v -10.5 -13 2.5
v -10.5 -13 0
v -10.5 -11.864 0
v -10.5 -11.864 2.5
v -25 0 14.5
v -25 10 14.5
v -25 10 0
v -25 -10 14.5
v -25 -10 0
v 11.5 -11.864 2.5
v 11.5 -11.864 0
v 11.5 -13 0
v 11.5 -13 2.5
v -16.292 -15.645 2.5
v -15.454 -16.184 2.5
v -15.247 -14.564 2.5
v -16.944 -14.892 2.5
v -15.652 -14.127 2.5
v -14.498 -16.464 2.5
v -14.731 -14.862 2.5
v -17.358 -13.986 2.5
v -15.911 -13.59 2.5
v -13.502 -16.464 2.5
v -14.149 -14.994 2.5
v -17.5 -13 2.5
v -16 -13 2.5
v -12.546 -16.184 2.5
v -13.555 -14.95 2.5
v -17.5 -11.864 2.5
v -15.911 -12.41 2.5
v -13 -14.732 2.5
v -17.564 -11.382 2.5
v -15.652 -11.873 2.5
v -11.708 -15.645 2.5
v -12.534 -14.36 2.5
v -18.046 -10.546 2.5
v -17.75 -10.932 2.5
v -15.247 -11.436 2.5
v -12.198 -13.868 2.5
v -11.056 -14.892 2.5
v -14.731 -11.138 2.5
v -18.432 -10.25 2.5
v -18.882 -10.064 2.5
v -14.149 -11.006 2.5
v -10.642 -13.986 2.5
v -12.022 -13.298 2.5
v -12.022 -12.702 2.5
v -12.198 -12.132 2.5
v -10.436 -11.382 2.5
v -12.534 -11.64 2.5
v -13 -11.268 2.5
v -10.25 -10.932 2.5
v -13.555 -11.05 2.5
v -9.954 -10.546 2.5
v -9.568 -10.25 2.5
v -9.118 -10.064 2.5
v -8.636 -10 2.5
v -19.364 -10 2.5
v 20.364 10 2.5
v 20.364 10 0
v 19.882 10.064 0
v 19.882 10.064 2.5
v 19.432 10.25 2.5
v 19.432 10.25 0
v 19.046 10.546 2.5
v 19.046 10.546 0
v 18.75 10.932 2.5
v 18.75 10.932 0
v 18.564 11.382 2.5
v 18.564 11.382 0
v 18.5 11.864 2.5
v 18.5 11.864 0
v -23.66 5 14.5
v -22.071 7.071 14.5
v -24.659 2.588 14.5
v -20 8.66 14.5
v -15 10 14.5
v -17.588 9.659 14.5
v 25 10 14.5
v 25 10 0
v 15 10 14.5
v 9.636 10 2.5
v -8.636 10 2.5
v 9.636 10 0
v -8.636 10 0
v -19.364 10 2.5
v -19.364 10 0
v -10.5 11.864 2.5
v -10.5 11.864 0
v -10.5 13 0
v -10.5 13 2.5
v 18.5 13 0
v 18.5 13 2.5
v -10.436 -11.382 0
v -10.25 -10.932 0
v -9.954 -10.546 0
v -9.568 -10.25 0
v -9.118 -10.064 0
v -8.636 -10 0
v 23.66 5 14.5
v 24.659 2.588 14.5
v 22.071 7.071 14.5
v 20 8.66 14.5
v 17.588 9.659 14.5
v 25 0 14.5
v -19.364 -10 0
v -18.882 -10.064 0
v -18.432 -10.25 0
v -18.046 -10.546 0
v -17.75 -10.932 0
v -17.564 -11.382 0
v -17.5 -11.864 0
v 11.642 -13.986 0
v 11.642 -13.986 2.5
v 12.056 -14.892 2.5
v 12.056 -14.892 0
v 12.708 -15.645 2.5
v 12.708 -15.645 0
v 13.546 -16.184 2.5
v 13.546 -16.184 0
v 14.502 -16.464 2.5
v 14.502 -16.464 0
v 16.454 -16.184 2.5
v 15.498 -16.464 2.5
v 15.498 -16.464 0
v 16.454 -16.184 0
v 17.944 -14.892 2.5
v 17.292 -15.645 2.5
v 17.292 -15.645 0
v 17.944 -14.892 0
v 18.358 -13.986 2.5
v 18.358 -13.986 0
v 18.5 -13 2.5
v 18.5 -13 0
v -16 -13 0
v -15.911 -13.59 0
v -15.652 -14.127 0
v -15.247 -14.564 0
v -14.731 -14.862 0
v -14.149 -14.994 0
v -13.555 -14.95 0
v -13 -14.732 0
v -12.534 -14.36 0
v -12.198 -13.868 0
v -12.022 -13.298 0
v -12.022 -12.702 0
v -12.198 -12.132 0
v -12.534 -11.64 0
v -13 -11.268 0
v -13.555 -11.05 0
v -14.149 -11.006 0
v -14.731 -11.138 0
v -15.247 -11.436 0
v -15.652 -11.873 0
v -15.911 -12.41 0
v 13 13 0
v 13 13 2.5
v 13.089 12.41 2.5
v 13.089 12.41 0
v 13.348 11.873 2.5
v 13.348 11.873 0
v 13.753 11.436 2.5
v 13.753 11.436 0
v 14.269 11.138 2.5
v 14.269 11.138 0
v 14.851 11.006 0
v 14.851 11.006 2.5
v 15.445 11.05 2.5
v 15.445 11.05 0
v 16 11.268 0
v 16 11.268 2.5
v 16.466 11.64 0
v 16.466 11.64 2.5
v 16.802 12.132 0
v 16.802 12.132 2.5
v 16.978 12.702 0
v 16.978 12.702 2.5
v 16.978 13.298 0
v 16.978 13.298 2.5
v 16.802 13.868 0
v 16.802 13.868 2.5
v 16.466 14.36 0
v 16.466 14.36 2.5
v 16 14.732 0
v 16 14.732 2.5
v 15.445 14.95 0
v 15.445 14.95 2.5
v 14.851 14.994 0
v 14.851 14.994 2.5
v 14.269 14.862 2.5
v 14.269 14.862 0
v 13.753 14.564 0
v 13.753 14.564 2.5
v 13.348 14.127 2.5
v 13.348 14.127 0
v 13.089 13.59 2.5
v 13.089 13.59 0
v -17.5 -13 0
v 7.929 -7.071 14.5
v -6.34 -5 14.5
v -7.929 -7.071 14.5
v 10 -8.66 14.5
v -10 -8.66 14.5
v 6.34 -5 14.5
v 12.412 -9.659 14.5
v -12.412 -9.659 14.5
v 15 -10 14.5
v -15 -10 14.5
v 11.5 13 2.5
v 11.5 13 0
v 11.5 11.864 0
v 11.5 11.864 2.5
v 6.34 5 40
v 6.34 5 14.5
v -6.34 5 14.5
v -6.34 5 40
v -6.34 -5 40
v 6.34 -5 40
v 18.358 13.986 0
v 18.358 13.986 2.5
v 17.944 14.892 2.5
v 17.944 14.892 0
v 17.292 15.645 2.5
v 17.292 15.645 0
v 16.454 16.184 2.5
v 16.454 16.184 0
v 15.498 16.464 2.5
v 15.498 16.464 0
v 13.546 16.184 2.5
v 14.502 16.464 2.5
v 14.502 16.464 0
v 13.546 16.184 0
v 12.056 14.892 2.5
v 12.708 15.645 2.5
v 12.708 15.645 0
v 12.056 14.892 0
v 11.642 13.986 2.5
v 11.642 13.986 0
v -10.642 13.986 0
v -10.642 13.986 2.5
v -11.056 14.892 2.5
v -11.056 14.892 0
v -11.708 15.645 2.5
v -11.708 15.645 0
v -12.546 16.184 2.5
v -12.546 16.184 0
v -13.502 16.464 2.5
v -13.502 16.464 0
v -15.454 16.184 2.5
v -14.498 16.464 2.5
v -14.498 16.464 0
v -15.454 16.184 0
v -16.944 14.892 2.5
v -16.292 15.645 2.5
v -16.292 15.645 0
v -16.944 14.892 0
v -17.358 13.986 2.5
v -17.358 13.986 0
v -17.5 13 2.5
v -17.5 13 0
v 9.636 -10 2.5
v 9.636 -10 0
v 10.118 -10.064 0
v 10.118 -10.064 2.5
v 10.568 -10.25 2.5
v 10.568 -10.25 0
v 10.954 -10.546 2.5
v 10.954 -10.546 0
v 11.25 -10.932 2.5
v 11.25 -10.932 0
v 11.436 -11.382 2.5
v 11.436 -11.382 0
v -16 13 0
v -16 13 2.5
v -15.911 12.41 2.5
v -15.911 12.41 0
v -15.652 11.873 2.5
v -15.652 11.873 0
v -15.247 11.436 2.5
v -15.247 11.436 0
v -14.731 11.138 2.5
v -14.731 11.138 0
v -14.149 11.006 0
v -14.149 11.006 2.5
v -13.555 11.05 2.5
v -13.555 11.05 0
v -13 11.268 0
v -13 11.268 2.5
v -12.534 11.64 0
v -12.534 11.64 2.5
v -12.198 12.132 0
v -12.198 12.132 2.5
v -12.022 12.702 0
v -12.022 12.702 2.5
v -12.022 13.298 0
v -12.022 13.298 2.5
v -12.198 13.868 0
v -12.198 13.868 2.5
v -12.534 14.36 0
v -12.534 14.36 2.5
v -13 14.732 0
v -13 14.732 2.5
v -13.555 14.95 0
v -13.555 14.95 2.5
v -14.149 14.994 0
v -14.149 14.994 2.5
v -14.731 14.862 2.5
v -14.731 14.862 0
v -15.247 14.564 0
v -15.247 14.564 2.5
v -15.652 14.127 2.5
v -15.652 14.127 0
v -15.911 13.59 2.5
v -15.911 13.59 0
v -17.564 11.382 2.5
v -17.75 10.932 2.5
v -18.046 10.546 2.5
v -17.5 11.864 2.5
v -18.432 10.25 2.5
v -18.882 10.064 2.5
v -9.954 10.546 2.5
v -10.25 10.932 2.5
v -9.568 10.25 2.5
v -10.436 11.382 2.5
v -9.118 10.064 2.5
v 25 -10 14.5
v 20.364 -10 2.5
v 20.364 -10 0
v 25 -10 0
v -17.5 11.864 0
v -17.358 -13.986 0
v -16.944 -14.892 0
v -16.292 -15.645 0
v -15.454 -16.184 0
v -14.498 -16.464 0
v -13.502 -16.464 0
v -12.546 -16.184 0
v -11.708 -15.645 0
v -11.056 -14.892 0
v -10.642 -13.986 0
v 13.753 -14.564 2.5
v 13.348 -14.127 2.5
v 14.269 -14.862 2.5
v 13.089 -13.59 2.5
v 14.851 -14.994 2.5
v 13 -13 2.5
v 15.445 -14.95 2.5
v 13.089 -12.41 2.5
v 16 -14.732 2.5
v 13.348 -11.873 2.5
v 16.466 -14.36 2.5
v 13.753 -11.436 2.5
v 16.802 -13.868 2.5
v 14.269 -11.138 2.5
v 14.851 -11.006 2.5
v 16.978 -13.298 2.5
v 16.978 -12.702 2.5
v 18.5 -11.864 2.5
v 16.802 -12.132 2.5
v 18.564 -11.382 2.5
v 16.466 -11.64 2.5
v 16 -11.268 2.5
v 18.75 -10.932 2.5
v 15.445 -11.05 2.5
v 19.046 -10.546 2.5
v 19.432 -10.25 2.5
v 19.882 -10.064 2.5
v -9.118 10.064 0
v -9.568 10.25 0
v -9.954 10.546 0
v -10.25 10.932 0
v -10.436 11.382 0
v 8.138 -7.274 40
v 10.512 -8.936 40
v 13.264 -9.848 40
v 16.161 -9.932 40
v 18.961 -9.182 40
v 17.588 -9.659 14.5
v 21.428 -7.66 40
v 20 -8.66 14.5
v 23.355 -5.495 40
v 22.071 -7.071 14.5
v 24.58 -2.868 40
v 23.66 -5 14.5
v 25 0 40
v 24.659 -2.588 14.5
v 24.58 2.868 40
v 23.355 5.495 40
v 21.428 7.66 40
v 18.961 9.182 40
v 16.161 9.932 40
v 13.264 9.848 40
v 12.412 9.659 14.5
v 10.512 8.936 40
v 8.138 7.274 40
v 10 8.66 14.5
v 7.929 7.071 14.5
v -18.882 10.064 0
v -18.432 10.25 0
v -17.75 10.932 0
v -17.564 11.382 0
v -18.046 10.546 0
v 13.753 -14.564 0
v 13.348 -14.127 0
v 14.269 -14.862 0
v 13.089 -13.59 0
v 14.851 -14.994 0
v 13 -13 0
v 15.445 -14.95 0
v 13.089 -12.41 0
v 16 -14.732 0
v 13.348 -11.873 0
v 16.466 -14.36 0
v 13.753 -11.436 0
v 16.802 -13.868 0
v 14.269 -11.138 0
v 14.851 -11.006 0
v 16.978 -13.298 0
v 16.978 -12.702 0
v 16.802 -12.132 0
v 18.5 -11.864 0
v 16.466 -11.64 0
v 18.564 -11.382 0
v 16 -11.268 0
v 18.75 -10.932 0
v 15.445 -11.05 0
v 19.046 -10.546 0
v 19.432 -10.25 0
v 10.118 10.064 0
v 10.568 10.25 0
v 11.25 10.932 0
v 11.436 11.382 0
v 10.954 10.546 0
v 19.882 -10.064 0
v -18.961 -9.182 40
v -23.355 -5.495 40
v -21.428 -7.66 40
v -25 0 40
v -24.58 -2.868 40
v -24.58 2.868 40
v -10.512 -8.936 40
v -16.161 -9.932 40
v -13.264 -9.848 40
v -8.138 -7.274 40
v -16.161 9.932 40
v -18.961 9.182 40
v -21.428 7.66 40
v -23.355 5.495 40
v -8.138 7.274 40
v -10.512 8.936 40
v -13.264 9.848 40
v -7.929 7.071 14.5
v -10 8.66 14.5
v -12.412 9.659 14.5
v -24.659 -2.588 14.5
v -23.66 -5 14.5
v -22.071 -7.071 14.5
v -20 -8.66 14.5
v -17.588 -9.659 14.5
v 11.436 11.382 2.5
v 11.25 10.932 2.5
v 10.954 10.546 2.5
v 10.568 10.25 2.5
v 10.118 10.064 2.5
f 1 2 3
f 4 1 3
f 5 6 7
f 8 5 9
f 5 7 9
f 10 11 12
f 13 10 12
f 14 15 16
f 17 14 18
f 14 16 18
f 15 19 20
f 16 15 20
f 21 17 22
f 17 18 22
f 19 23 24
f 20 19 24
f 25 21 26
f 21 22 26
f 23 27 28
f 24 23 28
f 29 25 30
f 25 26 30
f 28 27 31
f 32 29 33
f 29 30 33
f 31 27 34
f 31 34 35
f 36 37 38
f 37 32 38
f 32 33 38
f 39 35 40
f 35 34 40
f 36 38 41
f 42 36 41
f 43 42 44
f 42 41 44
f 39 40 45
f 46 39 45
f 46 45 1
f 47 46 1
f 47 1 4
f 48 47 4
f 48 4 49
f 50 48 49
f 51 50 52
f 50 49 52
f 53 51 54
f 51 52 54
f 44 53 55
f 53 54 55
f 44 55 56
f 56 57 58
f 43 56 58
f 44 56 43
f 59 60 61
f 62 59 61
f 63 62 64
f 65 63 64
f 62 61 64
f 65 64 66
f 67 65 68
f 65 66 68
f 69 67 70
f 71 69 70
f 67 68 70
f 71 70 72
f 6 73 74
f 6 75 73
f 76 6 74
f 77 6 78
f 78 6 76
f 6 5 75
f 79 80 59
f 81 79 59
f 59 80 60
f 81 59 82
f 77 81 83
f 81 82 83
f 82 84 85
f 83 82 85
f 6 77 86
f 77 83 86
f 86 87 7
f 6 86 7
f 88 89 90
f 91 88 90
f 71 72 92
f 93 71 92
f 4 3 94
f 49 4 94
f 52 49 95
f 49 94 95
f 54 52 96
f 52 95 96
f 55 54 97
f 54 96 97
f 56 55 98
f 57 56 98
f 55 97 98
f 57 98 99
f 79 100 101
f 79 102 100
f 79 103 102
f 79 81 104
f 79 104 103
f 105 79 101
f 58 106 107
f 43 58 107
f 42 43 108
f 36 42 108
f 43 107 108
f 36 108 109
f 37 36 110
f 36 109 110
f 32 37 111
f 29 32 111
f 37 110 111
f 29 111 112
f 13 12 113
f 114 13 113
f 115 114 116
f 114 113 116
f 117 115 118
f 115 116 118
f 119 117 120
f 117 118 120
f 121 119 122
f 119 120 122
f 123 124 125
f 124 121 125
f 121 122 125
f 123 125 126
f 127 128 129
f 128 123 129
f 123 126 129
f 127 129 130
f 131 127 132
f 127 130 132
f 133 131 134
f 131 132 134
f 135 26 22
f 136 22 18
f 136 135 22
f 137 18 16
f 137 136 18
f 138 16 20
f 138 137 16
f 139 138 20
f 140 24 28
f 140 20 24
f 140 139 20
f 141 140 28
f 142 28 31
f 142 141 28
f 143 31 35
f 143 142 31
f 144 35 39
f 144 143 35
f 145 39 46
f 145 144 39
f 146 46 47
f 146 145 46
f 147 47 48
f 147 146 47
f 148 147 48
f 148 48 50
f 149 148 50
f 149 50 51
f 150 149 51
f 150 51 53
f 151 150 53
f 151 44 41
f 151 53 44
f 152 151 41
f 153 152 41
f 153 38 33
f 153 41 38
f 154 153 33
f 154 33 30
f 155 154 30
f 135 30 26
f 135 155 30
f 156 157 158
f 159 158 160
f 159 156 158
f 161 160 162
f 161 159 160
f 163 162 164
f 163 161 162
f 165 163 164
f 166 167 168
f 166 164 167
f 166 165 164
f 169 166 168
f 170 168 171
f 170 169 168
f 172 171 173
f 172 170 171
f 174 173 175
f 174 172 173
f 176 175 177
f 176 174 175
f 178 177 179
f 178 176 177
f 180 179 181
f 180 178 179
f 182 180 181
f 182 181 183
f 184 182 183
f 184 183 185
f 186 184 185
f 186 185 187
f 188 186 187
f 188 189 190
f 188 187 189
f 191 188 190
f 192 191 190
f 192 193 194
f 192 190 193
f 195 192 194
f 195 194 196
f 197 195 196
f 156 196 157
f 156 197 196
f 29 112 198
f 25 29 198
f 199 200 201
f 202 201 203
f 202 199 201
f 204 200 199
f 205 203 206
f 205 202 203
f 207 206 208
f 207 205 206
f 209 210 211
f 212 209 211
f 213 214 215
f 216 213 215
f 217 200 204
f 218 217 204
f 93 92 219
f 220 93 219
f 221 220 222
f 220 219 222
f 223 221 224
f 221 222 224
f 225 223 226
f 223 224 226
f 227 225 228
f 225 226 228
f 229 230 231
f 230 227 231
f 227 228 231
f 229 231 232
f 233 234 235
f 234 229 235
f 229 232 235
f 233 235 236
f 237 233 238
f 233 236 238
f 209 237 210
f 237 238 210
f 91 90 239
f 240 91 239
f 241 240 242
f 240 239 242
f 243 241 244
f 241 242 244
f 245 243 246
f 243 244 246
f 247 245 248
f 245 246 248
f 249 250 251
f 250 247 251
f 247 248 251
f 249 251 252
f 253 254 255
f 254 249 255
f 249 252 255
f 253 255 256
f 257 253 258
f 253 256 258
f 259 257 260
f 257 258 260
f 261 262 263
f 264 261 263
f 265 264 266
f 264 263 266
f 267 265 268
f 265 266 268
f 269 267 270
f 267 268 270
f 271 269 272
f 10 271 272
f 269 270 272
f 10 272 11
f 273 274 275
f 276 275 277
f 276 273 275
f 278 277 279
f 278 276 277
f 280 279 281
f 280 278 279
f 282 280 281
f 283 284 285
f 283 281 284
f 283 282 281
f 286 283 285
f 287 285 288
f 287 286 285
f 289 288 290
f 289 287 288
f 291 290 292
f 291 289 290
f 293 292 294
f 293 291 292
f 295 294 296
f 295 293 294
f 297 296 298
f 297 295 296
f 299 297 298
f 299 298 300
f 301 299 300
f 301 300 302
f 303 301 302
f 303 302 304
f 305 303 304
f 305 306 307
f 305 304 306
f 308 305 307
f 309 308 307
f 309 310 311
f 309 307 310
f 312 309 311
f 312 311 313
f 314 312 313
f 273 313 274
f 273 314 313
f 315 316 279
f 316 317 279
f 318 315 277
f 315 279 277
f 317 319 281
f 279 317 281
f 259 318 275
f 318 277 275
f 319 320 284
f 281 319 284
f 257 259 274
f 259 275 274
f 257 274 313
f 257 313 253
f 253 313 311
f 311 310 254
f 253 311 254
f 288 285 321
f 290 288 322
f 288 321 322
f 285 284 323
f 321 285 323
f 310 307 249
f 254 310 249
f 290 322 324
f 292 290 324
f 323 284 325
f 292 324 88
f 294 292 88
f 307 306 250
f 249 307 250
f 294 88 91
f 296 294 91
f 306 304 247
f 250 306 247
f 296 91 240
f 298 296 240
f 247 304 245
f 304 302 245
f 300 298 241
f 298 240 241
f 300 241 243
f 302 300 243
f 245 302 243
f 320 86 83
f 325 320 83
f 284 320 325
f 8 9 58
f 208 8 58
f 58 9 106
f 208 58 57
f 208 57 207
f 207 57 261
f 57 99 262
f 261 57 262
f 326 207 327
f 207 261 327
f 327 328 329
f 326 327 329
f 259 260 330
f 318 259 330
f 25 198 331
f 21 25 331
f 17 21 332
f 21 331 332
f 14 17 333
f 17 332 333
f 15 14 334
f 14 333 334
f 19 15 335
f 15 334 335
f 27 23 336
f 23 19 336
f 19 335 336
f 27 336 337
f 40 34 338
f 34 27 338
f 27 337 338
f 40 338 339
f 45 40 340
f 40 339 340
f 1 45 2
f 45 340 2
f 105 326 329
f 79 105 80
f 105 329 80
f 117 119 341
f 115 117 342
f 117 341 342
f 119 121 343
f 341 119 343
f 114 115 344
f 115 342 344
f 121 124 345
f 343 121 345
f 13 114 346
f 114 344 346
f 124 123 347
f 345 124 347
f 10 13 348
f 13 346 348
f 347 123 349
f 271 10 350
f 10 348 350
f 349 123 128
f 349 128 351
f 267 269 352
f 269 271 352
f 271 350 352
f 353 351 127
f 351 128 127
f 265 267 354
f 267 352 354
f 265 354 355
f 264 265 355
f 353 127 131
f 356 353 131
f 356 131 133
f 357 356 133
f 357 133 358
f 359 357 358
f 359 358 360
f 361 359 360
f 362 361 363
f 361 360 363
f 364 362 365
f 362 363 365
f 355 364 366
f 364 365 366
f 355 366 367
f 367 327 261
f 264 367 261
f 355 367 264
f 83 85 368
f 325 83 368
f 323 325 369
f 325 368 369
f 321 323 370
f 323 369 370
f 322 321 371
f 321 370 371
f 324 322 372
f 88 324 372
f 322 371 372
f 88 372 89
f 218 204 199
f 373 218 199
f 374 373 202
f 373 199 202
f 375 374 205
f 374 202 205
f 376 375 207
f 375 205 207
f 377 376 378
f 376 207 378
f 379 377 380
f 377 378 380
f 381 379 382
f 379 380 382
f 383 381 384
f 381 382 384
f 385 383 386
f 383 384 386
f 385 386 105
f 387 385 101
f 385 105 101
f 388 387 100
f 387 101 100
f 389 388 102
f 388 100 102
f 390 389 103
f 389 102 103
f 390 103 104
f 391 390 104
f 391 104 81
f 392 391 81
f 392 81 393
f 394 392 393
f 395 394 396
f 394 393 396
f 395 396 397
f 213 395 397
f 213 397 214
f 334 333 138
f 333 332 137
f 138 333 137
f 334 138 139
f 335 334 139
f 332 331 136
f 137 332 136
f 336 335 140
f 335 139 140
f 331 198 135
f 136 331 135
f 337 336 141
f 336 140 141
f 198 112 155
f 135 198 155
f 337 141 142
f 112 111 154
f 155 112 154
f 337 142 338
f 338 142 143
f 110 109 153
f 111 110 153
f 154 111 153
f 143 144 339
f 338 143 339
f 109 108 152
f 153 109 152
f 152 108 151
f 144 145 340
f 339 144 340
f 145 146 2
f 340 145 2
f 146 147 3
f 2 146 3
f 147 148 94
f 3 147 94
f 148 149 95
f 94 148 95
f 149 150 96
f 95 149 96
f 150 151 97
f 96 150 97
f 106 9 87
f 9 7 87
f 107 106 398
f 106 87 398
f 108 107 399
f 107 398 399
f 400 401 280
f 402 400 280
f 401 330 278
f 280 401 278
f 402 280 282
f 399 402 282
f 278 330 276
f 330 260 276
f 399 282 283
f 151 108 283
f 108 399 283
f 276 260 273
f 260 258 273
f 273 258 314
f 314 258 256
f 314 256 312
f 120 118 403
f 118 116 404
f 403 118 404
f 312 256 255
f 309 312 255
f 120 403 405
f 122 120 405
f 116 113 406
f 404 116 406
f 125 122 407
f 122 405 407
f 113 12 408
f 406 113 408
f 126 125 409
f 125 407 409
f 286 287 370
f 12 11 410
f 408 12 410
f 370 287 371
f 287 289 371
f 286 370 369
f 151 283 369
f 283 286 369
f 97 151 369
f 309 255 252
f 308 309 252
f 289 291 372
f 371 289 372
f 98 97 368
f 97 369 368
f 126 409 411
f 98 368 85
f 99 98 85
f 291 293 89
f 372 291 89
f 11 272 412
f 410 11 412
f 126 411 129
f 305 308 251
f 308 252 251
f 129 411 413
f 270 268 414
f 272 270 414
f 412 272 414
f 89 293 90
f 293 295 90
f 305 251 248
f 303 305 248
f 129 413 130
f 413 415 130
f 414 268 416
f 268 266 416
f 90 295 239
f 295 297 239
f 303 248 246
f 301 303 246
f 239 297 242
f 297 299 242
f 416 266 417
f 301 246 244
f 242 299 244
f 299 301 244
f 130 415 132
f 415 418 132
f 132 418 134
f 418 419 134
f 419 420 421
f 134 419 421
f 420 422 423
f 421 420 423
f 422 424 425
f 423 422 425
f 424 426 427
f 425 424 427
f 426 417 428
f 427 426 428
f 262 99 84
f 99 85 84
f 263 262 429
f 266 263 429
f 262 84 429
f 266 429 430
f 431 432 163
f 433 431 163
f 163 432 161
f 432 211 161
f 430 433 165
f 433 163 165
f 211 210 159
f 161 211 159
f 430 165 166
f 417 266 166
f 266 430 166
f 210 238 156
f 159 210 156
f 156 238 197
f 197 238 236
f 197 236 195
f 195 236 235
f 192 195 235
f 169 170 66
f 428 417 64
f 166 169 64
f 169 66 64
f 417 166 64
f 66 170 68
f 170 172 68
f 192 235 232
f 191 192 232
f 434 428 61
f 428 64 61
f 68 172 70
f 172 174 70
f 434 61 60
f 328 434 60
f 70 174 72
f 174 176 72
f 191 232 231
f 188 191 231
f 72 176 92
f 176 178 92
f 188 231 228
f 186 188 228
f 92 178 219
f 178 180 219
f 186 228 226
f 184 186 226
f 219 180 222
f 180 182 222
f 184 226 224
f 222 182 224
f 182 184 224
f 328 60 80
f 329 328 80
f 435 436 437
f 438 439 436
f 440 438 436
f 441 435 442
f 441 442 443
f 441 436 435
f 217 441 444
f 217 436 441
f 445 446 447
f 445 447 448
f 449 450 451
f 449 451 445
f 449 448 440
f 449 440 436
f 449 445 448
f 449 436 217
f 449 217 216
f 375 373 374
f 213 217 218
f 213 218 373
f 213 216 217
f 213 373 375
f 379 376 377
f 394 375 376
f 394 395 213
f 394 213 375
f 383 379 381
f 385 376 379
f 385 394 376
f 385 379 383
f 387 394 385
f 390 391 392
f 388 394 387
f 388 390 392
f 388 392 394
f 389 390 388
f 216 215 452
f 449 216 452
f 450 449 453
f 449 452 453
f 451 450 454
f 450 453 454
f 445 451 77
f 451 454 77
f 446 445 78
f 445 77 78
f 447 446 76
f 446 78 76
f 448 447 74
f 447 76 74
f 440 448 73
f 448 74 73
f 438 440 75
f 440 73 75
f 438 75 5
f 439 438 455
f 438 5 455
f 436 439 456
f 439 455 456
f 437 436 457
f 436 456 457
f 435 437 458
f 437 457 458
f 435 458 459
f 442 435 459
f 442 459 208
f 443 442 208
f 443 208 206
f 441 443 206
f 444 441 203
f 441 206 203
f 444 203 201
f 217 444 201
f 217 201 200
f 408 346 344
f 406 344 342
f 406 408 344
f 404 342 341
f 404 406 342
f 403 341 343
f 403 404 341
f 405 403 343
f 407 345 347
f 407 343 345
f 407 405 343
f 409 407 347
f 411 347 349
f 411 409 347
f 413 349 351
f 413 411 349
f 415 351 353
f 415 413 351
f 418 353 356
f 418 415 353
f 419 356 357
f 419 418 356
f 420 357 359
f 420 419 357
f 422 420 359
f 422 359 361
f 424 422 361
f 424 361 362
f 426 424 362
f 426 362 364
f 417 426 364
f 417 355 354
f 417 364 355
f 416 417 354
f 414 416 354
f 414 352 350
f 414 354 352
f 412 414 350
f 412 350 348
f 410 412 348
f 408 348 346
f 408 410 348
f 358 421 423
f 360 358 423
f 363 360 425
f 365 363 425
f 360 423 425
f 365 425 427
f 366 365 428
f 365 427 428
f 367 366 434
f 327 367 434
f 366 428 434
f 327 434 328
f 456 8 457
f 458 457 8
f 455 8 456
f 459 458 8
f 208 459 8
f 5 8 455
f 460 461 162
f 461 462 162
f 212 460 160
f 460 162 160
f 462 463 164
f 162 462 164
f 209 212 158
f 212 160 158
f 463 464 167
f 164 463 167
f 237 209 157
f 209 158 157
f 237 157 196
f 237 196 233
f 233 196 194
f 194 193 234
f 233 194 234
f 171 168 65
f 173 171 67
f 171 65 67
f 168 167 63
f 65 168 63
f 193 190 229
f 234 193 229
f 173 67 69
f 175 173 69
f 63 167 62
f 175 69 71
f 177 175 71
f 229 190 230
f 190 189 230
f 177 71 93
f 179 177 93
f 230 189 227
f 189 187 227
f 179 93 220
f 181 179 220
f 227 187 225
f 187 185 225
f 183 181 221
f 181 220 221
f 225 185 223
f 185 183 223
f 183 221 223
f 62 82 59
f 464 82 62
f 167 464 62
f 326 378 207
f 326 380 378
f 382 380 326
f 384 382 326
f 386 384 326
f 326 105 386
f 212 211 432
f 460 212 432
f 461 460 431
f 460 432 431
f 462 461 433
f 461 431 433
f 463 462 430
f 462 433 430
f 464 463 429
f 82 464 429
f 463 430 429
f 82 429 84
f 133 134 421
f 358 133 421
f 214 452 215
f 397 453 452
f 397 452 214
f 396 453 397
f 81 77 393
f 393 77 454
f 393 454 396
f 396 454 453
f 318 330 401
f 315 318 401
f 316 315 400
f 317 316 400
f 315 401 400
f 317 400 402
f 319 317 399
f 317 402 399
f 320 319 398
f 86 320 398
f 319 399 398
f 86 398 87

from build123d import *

# Parameters (mm, degrees)
ESQUISSE1_R             = 2
BOSS_EXTRU_1_DEPTH      = 14.5
ESQUISSE3_W             = 12
ESQUISSE3_H             = 6.5
ENL_V_MAT_EXTRU_1_DEPTH = 55.612269684
BOSS_EXTRU_2_DEPTH      = 25.5


with BuildPart() as part:
    # Esquisse1 → Boss.-Extru.1 (new body)
    with BuildSketch(Plane.XY):
        with BuildLine():
            Line((-25, -10), (-19.364230348, -10))
            ThreePointArc((-19.364230348, -10), (-18.046020427, -10.546020427), (-17.5, -11.864230348))
            Line((-17.5, -11.864230348), (-17.5, -13))
            ThreePointArc((-17.5, -13), (-14, -16.5), (-10.5, -13))
            Line((-10.5, -13), (-10.5, -11.864230348))
            ThreePointArc((-10.5, -11.864230348), (-9.953979573, -10.546020427), (-8.635769652, -10))
            Line((-8.635769652, -10), (9.635769652, -10))
            ThreePointArc((9.635769652, -10), (10.953979573, -10.546020427), (11.5, -11.864230348))
            Line((11.5, -11.864230348), (11.5, -13))
            ThreePointArc((11.5, -13), (15, -16.5), (18.5, -13))
            Line((18.5, -13), (18.5, -11.864230348))
            ThreePointArc((18.5, -11.864230348), (19.046020427, -10.546020427), (20.364230348, -10))
            Line((20.364230348, -10), (25, -10))
            Line((25, -10), (25, 10))
            Line((25, 10), (20.364230348, 10))
            ThreePointArc((20.364230348, 10), (19.046020427, 10.546020427), (18.5, 11.864230348))
            Line((18.5, 11.864230348), (18.5, 13))
            ThreePointArc((18.5, 13), (15, 16.5), (11.5, 13))
            Line((11.5, 13), (11.5, 11.864230348))
            ThreePointArc((11.5, 11.864230348), (10.953979573, 10.546020427), (9.635769652, 10))
            Line((9.635769652, 10), (-8.635769652, 10))
            ThreePointArc((-8.635769652, 10), (-9.953979573, 10.546020427), (-10.5, 11.864230348))
            Line((-10.5, 11.864230348), (-10.5, 13))
            ThreePointArc((-10.5, 13), (-14, 16.5), (-17.5, 13))
            Line((-17.5, 13), (-17.5, 11.864230348))
            ThreePointArc((-17.5, 11.864230348), (-18.046020427, 10.546020427), (-19.364230348, 10))
            Line((-19.364230348, 10), (-25, 10))
            Line((-25, 10), (-25, -10))
        make_face()
        with Locations(Location((-14, 13, 0), (0, 0, 180))):
            Circle(ESQUISSE1_R, mode=Mode.SUBTRACT)
        with Locations(Location((15, 13, 0), (0, 0, 180))):
            Circle(ESQUISSE1_R, mode=Mode.SUBTRACT)
        with Locations(Location((-14, -13, 0), (0, 0, 180))):
            Circle(ESQUISSE1_R, mode=Mode.SUBTRACT)
        with Locations(Location((15, -13, 0), (0, 0, 180))):
            Circle(ESQUISSE1_R, mode=Mode.SUBTRACT)
    extrude(amount=BOSS_EXTRU_1_DEPTH)

    # Esquisse3 → Enlèv. mat.-Extru.1 (cut, through all)
    with BuildSketch(Plane(origin=(25, 0, 0), x_dir=(0, 0, -1), z_dir=(1, 0, 0))):
        with Locations((-8.5, 13.25)):
            Rectangle(ESQUISSE3_W, ESQUISSE3_H)
        with Locations((-8.5, -13.25)):
            Rectangle(ESQUISSE3_W, ESQUISSE3_H)
    extrude(amount=-ENL_V_MAT_EXTRU_1_DEPTH, mode=Mode.SUBTRACT)

    # Esquisse4 → Boss.-Extru.2 (add)
    with BuildSketch(Plane.XY.offset(14.5)):
        with BuildLine():
            Line((-6.339745962, -5), (6.339745962, -5))
            ThreePointArc((6.339745962, -5), (25, 0), (6.339745962, 5))
            Line((6.339745962, 5), (-6.339745962, 5))
            ThreePointArc((-6.339745962, 5), (-25, 0), (-6.339745962, -5))
        make_face()
    extrude(amount=BOSS_EXTRU_2_DEPTH)


solid = part.part
